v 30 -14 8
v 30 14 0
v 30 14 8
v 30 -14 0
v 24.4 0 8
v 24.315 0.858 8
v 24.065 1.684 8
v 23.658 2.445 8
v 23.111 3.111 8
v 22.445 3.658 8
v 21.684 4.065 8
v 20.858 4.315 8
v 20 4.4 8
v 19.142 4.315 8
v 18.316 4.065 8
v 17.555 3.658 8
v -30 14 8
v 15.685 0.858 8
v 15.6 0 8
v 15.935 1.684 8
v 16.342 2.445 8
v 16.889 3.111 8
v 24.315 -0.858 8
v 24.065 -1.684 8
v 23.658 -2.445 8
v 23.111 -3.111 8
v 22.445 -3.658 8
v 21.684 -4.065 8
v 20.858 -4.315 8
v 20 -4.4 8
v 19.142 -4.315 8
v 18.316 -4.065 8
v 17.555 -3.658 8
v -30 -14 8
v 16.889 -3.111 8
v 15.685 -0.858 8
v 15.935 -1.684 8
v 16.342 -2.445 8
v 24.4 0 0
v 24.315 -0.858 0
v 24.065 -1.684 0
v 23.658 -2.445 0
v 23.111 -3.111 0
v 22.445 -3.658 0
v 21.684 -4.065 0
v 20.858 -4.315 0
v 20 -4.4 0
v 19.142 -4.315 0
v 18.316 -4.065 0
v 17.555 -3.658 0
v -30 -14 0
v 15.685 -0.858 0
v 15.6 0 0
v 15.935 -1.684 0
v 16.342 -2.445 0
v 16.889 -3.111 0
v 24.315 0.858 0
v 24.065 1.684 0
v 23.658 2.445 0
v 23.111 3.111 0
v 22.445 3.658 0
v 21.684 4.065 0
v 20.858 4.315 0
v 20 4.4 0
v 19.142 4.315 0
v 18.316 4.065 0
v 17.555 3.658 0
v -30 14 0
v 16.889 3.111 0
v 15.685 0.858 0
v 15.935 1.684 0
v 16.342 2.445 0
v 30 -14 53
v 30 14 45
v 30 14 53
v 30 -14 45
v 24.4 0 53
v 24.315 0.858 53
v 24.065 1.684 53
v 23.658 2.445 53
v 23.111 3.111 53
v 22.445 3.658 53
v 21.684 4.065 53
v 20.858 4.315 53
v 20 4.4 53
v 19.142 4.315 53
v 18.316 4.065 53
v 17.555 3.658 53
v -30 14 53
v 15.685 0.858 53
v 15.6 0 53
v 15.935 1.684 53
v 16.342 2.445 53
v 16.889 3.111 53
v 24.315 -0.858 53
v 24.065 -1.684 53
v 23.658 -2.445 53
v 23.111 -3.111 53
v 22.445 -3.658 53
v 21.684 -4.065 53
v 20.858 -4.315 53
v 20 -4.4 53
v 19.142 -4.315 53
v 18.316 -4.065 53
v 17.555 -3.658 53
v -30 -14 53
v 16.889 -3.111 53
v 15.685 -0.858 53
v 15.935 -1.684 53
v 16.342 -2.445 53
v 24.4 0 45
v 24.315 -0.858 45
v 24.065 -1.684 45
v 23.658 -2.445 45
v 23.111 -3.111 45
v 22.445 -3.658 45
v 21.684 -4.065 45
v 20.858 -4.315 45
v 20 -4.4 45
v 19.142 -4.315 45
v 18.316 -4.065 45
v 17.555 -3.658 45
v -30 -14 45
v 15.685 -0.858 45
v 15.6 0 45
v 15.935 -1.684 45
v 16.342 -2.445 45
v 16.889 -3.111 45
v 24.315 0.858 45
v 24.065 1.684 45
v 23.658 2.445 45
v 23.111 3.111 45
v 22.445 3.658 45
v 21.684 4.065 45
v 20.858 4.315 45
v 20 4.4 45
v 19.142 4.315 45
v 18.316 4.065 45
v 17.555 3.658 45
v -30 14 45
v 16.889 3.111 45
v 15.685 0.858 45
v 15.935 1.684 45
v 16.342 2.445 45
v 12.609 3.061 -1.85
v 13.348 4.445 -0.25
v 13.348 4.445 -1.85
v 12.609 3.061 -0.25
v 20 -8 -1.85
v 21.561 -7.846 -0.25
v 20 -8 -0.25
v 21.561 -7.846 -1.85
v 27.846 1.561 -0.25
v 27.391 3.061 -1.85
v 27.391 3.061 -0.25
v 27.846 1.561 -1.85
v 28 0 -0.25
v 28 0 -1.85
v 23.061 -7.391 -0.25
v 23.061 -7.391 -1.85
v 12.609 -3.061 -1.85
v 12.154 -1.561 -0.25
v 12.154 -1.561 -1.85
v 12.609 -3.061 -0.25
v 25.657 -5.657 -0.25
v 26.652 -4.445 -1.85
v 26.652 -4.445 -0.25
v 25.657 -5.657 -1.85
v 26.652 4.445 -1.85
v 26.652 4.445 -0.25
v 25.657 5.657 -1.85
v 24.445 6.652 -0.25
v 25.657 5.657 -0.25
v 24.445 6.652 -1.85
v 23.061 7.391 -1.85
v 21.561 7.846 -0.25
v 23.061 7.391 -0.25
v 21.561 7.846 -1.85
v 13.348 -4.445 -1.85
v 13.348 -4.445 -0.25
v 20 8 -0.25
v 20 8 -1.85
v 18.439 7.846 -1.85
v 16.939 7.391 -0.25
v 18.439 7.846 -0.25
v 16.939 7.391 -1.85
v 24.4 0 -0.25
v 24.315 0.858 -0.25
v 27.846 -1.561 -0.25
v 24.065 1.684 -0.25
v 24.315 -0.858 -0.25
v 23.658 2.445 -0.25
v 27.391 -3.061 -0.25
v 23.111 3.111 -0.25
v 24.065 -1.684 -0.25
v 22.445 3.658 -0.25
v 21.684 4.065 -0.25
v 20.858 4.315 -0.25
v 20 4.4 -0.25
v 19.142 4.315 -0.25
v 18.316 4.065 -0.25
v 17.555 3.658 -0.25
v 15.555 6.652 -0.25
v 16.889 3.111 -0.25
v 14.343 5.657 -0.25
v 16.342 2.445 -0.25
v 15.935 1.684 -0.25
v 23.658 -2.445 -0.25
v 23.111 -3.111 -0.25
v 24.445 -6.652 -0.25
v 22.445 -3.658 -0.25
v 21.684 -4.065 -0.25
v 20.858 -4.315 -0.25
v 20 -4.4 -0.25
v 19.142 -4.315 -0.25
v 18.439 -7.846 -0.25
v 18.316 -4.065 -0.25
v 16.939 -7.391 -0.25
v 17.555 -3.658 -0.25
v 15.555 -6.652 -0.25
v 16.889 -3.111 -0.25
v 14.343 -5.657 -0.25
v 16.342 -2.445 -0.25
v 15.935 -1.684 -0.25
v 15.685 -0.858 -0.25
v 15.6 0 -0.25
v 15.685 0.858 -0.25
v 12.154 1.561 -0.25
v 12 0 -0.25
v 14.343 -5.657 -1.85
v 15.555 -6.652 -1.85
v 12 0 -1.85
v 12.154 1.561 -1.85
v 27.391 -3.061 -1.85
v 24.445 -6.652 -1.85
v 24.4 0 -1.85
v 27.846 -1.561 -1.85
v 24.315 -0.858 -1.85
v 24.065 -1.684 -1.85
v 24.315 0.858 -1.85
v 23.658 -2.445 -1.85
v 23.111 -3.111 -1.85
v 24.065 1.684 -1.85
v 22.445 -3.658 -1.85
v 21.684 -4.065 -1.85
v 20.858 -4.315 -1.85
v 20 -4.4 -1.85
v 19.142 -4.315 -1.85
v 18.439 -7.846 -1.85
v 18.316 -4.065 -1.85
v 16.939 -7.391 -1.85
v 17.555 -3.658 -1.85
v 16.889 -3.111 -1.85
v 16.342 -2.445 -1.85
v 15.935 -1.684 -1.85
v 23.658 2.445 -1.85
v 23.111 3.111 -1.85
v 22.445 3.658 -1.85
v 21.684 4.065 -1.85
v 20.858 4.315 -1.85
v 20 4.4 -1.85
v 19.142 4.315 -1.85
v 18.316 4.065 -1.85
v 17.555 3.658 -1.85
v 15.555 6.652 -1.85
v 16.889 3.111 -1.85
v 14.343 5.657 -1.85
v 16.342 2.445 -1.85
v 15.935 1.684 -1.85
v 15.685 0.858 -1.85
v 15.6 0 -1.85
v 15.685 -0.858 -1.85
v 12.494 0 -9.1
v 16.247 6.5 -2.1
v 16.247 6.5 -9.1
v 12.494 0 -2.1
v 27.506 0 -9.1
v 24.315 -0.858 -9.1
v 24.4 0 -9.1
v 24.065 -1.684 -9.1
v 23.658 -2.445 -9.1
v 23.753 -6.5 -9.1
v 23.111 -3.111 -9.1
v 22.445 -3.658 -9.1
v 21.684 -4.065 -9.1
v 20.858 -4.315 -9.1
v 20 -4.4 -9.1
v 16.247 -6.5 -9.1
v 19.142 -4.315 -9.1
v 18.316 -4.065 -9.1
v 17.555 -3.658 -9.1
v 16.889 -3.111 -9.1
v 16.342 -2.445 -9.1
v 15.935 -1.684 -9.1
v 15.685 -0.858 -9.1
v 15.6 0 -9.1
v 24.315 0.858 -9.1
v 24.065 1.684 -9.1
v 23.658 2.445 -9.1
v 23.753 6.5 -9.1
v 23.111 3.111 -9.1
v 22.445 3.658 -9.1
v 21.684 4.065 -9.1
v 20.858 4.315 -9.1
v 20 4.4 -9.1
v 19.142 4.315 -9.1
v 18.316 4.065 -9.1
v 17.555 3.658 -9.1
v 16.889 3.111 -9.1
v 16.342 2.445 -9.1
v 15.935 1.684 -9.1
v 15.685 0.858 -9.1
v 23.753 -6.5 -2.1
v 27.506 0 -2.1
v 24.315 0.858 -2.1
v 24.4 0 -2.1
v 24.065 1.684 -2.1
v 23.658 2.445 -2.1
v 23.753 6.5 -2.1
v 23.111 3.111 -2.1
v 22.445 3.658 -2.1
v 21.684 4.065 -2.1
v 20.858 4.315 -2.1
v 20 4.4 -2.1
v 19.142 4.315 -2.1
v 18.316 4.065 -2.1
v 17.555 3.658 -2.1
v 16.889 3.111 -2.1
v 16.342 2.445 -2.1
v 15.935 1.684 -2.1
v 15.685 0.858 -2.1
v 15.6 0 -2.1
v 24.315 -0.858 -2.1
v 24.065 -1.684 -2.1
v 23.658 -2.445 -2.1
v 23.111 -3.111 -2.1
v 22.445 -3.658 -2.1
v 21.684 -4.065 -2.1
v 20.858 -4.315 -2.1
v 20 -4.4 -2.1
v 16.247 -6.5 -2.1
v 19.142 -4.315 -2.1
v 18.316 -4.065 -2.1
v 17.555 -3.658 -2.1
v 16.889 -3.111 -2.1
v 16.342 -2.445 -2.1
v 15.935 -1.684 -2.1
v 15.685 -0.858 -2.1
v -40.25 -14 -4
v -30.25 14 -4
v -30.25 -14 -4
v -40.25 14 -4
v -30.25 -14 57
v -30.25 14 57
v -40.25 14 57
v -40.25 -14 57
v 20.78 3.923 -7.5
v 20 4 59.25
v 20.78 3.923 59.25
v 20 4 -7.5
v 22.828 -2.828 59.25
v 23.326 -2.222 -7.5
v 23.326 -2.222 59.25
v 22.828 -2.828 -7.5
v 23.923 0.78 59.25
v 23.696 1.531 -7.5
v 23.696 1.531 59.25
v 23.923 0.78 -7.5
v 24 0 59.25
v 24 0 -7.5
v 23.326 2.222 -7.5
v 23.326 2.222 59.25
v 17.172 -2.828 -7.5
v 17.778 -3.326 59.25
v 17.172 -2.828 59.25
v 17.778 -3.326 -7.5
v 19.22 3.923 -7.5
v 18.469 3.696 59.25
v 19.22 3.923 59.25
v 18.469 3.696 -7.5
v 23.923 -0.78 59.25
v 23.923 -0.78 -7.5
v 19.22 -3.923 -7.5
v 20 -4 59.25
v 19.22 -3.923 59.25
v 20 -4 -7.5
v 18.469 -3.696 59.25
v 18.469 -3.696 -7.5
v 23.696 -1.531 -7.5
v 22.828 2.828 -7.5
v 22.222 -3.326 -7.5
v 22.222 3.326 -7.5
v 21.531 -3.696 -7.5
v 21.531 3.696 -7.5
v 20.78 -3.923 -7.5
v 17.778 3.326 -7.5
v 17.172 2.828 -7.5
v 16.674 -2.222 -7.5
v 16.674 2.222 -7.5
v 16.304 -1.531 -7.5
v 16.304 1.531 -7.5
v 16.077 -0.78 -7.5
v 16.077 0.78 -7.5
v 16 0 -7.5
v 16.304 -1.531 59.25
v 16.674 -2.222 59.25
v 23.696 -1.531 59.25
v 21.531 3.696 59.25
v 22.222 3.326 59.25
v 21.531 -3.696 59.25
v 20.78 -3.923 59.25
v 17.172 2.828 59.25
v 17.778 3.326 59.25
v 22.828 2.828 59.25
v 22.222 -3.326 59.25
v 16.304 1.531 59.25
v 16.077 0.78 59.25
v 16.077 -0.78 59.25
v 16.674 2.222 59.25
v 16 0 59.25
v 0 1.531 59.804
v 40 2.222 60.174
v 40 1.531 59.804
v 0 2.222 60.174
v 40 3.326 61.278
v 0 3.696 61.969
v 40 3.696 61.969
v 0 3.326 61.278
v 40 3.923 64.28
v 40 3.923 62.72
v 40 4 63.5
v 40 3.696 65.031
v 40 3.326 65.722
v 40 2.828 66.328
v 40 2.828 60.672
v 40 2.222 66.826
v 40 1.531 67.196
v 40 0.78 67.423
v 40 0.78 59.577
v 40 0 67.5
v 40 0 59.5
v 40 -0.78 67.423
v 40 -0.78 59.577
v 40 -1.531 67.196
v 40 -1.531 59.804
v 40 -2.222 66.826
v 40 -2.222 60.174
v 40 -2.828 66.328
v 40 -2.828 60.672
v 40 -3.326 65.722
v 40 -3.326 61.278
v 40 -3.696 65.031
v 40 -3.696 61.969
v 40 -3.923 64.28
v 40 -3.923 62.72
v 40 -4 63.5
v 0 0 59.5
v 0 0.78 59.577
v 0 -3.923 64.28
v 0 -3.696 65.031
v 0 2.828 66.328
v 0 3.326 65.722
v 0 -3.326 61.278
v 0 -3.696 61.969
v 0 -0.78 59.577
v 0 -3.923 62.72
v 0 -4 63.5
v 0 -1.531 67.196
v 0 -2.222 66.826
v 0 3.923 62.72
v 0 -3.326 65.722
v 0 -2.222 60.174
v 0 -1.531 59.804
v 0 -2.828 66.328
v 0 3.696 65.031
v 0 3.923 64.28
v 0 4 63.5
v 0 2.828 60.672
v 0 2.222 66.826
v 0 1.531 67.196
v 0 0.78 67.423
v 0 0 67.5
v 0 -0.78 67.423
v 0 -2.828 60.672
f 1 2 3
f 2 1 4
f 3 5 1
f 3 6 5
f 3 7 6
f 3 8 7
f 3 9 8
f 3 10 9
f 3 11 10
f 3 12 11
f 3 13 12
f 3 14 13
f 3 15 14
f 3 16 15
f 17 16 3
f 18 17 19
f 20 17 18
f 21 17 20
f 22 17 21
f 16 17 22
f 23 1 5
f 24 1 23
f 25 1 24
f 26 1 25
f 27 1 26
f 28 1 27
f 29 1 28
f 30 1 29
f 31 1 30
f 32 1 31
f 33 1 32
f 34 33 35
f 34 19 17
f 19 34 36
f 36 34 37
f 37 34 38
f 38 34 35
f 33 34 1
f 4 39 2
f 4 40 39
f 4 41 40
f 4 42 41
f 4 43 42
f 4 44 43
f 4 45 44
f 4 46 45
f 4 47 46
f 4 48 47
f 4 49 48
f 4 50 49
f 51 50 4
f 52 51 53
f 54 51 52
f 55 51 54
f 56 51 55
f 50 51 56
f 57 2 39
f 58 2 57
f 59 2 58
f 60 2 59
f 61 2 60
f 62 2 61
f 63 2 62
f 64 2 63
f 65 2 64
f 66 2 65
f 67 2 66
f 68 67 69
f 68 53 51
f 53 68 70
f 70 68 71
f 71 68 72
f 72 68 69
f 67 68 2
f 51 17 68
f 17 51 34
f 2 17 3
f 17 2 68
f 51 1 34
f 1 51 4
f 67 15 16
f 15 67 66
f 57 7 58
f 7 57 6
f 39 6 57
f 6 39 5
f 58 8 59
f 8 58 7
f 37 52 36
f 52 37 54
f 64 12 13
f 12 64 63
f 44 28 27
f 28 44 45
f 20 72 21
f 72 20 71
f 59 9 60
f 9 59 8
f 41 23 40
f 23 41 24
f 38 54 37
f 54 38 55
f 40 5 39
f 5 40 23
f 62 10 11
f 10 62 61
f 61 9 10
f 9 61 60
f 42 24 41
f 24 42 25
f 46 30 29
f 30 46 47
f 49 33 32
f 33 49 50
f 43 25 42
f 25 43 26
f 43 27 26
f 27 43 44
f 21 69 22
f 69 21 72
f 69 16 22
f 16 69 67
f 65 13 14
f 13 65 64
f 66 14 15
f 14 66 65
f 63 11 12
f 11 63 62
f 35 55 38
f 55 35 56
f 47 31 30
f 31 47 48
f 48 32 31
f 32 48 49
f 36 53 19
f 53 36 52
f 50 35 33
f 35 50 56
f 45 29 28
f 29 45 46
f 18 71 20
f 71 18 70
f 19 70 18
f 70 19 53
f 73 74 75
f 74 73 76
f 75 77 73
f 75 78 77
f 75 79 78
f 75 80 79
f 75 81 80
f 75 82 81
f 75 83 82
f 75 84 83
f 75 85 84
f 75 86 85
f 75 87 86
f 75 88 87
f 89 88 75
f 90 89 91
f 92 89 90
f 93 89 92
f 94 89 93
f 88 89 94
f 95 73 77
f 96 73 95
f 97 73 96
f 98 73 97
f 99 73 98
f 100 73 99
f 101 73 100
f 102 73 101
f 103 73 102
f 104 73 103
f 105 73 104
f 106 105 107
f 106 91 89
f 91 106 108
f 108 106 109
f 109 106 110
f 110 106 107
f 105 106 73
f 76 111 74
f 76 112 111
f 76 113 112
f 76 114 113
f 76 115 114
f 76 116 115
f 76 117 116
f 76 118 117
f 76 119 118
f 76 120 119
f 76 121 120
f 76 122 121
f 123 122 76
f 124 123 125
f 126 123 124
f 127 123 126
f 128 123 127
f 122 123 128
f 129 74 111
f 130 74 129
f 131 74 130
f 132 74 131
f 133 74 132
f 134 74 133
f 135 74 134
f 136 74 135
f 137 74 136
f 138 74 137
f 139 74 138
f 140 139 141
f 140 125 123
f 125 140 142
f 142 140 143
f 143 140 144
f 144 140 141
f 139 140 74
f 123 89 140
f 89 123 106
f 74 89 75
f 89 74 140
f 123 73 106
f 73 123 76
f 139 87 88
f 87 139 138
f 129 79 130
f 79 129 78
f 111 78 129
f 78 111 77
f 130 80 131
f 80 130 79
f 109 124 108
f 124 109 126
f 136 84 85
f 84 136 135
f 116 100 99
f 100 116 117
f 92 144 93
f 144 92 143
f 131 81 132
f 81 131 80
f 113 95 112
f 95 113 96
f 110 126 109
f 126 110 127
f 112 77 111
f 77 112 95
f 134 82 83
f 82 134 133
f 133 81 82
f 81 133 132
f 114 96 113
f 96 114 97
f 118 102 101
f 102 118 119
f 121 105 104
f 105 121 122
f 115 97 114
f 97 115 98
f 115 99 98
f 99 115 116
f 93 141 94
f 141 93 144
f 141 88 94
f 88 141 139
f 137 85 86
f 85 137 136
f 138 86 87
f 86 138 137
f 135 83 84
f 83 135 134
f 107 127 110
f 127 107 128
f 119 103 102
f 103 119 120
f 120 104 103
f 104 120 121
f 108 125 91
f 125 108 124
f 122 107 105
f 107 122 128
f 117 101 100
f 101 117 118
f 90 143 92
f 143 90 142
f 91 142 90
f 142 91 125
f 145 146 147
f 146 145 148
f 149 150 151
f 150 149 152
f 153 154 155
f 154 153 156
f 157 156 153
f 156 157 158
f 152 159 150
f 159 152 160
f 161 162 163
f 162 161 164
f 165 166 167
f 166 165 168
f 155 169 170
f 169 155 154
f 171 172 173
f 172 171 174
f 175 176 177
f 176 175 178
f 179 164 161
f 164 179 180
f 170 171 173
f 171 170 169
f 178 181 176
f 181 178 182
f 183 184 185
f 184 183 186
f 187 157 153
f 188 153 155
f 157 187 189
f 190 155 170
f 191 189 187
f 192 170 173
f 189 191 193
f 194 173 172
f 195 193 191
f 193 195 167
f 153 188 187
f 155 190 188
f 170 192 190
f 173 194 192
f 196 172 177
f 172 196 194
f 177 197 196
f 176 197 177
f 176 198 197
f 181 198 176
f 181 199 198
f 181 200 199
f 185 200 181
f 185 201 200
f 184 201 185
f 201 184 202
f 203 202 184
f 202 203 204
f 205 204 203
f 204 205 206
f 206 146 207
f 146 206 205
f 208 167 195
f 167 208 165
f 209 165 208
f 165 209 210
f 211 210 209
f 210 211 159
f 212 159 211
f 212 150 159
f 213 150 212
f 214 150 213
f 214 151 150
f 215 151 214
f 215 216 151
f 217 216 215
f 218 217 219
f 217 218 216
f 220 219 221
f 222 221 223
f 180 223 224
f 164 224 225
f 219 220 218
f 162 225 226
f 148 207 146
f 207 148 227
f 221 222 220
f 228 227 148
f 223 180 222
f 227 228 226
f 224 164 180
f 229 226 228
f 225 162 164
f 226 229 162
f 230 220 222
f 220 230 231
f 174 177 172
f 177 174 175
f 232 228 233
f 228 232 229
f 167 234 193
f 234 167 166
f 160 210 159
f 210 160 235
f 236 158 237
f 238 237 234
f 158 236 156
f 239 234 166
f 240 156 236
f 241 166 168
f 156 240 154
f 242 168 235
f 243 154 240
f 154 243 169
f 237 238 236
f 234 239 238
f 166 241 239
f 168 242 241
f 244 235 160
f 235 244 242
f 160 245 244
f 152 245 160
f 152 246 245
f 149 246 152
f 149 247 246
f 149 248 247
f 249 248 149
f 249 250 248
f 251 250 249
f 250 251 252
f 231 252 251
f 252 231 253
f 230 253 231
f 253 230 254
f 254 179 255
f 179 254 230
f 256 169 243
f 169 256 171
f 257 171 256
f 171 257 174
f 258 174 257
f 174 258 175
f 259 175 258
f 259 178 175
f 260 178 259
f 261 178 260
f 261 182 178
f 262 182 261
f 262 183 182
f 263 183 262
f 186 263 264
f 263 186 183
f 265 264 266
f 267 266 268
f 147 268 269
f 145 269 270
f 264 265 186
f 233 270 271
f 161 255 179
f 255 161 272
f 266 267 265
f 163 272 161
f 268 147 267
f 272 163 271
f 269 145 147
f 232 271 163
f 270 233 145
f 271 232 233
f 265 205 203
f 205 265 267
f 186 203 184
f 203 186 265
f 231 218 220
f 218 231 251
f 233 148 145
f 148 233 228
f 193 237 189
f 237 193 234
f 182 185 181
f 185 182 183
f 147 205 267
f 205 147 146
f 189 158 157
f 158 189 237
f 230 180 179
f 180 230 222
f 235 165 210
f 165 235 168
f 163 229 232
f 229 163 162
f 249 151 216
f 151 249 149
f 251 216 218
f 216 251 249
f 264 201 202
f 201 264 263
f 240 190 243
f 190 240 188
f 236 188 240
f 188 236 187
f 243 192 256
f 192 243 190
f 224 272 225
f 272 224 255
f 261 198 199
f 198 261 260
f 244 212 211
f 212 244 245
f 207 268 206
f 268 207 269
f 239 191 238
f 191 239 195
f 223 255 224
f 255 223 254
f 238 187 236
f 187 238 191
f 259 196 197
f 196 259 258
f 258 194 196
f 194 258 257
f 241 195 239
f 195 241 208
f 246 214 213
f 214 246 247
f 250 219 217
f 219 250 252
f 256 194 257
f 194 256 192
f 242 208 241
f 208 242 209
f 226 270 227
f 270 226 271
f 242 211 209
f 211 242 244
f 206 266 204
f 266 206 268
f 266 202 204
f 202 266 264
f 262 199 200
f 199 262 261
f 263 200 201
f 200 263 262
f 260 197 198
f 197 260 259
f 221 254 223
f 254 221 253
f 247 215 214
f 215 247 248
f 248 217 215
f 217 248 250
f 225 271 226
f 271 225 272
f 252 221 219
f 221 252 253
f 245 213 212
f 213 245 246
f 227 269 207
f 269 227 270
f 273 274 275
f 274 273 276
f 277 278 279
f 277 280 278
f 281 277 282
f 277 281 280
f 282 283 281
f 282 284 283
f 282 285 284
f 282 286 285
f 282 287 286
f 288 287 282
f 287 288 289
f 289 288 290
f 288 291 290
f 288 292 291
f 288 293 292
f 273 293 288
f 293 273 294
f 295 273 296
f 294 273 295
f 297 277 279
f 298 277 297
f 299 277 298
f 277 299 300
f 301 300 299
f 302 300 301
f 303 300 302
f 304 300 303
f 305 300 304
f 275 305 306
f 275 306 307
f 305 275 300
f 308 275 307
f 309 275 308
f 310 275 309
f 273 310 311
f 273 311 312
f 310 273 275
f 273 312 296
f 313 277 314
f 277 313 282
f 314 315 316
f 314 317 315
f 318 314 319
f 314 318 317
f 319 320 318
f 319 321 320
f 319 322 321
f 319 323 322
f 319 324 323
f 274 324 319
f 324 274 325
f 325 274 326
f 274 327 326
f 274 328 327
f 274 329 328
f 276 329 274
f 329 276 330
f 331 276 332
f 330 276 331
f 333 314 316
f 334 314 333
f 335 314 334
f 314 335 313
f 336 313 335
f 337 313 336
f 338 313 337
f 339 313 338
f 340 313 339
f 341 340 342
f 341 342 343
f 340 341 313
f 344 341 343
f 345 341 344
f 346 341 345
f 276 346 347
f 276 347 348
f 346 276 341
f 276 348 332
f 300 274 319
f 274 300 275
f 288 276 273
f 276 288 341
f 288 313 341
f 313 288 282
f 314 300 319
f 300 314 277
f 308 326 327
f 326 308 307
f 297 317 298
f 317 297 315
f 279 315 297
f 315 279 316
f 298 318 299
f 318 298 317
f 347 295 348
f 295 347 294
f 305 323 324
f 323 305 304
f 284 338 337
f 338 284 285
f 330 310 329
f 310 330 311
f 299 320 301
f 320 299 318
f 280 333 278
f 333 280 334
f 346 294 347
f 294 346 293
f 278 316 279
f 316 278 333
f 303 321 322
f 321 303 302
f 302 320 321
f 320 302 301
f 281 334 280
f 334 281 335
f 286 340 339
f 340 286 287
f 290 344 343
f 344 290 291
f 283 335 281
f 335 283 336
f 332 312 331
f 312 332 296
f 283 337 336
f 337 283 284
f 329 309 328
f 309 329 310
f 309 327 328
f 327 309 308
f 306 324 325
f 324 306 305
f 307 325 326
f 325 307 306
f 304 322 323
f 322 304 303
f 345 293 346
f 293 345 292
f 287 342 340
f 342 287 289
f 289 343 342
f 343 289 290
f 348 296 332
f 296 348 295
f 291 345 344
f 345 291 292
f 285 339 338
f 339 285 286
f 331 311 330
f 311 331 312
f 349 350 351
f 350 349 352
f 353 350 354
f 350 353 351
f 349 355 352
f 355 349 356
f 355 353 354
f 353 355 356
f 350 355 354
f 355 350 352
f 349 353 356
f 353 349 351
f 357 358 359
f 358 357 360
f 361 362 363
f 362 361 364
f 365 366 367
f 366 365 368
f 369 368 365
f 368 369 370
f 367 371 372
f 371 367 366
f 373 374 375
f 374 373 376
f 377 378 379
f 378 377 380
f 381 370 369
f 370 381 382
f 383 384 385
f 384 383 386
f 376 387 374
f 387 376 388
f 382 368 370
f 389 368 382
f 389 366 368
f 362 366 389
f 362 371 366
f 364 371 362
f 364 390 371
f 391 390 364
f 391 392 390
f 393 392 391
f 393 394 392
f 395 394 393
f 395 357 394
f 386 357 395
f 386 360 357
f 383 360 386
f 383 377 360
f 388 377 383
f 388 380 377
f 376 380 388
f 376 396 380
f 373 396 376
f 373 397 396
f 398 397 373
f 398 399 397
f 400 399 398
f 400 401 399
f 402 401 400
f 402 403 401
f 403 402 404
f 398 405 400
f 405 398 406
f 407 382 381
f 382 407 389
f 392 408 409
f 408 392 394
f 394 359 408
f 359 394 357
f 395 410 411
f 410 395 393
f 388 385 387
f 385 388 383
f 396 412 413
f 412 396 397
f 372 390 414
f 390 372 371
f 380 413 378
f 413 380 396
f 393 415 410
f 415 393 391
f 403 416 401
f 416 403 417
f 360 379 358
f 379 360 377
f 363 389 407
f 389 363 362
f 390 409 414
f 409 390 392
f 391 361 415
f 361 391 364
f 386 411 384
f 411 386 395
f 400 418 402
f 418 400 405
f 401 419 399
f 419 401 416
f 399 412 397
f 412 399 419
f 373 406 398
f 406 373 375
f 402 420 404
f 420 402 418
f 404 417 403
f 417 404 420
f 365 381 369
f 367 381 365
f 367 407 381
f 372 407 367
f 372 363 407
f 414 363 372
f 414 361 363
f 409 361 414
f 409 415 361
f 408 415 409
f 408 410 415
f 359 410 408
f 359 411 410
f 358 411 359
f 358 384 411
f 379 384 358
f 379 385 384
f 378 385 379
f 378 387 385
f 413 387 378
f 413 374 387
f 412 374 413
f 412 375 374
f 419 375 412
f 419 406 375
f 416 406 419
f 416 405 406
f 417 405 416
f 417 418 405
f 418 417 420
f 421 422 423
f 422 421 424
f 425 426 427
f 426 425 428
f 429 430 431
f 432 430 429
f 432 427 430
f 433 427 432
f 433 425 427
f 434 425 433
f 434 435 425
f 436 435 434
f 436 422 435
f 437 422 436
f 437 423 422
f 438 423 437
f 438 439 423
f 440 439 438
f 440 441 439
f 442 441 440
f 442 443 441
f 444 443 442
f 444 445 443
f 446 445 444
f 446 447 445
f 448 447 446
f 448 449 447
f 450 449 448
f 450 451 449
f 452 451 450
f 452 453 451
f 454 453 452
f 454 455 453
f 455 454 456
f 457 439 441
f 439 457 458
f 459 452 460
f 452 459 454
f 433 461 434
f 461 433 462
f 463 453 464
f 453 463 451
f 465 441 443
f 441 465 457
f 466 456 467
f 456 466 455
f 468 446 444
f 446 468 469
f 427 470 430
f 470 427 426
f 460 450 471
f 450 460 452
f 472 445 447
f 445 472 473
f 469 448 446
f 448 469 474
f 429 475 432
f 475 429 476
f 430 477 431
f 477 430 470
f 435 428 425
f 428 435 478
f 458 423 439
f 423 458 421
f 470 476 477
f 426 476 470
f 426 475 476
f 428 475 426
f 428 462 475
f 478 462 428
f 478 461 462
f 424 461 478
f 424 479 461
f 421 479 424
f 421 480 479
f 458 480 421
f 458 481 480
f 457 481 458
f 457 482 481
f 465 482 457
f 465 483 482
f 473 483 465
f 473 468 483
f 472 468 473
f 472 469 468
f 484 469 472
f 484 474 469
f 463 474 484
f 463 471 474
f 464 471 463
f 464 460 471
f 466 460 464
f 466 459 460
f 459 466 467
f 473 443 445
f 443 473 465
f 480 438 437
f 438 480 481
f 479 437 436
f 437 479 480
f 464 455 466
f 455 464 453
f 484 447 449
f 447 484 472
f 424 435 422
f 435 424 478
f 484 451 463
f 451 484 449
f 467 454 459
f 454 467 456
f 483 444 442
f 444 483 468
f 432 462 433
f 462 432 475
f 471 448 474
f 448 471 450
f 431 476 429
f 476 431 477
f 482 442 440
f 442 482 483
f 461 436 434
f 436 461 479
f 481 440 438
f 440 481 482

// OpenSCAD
$fn = 32;

// ------------------------------------------------------------------------
// C clamp: throat 45 mm, screw d8
// Every part is its own module, assembly() places every instance.
// ------------------------------------------------------------------------

// --- part 1 ---
module clamp_arm() {
  difference() {
    translate([-30, -14, 0]) cube([60, 28, 8]);
    translate([20, 0, -1]) cylinder(h = 10, d = 8.8);
  }
}

// --- part 2 ---
module clamp_spine() {
  difference() {
    translate([-30.5, -14, 0]) cube([61, 28, 10]);
  }
}

// --- part 3 ---
module clamp_screw() {
  translate([0, 0, -33.375]) cylinder(h = 66.75, d = 8);
}

// --- part 4 ---
module clamp_washer() {
  difference() {
      translate([0, 0, 0]) cylinder(h = 1.6, d = 16);
      translate([0, 0, -1]) cylinder(h = 3.6, d = 8.8);
    }
}

// --- part 5 ---
module clamp_nut() {
  difference() {
    linear_extrude(height = 7) polygon(points = [[7.506, 0], [3.753, 6.5], [-3.753, 6.5], [-7.506, 0], [-3.753, -6.5], [3.753, -6.5]]);
    translate([0, 0, -1]) cylinder(h = 9, d = 8.8);
  }
}

// --- part 6 ---
module tommy_bar() {
  translate([0, 0, -20]) cylinder(h = 40, d = 8);
}

// --- assembly ---
module assembly() {
  color([0.80, 0.24, 0.20]) translate([0, 0, 0]) rotate([0, 0, 0]) clamp_arm();
  color([0.20, 0.45, 0.75]) translate([0, 0, 45]) rotate([0, 0, 0]) clamp_arm();
  color([0.25, 0.62, 0.32]) translate([-40.25, 0, 26.5]) rotate([0, 90, 0]) clamp_spine();
  color([0.92, 0.70, 0.18]) translate([20, 0, 25.875]) rotate([0, 0, 0]) clamp_screw();
  color([0.58, 0.35, 0.70]) translate([20, 0, -1.85]) rotate([0, 0, 0]) clamp_washer();
  color([0.16, 0.66, 0.66]) translate([20, 0, -9.1]) rotate([0, 0, 0]) clamp_nut();
  color([0.85, 0.48, 0.18]) translate([20, 0, 63.5]) rotate([0, 90, 0]) tommy_bar();
}

assembly();
